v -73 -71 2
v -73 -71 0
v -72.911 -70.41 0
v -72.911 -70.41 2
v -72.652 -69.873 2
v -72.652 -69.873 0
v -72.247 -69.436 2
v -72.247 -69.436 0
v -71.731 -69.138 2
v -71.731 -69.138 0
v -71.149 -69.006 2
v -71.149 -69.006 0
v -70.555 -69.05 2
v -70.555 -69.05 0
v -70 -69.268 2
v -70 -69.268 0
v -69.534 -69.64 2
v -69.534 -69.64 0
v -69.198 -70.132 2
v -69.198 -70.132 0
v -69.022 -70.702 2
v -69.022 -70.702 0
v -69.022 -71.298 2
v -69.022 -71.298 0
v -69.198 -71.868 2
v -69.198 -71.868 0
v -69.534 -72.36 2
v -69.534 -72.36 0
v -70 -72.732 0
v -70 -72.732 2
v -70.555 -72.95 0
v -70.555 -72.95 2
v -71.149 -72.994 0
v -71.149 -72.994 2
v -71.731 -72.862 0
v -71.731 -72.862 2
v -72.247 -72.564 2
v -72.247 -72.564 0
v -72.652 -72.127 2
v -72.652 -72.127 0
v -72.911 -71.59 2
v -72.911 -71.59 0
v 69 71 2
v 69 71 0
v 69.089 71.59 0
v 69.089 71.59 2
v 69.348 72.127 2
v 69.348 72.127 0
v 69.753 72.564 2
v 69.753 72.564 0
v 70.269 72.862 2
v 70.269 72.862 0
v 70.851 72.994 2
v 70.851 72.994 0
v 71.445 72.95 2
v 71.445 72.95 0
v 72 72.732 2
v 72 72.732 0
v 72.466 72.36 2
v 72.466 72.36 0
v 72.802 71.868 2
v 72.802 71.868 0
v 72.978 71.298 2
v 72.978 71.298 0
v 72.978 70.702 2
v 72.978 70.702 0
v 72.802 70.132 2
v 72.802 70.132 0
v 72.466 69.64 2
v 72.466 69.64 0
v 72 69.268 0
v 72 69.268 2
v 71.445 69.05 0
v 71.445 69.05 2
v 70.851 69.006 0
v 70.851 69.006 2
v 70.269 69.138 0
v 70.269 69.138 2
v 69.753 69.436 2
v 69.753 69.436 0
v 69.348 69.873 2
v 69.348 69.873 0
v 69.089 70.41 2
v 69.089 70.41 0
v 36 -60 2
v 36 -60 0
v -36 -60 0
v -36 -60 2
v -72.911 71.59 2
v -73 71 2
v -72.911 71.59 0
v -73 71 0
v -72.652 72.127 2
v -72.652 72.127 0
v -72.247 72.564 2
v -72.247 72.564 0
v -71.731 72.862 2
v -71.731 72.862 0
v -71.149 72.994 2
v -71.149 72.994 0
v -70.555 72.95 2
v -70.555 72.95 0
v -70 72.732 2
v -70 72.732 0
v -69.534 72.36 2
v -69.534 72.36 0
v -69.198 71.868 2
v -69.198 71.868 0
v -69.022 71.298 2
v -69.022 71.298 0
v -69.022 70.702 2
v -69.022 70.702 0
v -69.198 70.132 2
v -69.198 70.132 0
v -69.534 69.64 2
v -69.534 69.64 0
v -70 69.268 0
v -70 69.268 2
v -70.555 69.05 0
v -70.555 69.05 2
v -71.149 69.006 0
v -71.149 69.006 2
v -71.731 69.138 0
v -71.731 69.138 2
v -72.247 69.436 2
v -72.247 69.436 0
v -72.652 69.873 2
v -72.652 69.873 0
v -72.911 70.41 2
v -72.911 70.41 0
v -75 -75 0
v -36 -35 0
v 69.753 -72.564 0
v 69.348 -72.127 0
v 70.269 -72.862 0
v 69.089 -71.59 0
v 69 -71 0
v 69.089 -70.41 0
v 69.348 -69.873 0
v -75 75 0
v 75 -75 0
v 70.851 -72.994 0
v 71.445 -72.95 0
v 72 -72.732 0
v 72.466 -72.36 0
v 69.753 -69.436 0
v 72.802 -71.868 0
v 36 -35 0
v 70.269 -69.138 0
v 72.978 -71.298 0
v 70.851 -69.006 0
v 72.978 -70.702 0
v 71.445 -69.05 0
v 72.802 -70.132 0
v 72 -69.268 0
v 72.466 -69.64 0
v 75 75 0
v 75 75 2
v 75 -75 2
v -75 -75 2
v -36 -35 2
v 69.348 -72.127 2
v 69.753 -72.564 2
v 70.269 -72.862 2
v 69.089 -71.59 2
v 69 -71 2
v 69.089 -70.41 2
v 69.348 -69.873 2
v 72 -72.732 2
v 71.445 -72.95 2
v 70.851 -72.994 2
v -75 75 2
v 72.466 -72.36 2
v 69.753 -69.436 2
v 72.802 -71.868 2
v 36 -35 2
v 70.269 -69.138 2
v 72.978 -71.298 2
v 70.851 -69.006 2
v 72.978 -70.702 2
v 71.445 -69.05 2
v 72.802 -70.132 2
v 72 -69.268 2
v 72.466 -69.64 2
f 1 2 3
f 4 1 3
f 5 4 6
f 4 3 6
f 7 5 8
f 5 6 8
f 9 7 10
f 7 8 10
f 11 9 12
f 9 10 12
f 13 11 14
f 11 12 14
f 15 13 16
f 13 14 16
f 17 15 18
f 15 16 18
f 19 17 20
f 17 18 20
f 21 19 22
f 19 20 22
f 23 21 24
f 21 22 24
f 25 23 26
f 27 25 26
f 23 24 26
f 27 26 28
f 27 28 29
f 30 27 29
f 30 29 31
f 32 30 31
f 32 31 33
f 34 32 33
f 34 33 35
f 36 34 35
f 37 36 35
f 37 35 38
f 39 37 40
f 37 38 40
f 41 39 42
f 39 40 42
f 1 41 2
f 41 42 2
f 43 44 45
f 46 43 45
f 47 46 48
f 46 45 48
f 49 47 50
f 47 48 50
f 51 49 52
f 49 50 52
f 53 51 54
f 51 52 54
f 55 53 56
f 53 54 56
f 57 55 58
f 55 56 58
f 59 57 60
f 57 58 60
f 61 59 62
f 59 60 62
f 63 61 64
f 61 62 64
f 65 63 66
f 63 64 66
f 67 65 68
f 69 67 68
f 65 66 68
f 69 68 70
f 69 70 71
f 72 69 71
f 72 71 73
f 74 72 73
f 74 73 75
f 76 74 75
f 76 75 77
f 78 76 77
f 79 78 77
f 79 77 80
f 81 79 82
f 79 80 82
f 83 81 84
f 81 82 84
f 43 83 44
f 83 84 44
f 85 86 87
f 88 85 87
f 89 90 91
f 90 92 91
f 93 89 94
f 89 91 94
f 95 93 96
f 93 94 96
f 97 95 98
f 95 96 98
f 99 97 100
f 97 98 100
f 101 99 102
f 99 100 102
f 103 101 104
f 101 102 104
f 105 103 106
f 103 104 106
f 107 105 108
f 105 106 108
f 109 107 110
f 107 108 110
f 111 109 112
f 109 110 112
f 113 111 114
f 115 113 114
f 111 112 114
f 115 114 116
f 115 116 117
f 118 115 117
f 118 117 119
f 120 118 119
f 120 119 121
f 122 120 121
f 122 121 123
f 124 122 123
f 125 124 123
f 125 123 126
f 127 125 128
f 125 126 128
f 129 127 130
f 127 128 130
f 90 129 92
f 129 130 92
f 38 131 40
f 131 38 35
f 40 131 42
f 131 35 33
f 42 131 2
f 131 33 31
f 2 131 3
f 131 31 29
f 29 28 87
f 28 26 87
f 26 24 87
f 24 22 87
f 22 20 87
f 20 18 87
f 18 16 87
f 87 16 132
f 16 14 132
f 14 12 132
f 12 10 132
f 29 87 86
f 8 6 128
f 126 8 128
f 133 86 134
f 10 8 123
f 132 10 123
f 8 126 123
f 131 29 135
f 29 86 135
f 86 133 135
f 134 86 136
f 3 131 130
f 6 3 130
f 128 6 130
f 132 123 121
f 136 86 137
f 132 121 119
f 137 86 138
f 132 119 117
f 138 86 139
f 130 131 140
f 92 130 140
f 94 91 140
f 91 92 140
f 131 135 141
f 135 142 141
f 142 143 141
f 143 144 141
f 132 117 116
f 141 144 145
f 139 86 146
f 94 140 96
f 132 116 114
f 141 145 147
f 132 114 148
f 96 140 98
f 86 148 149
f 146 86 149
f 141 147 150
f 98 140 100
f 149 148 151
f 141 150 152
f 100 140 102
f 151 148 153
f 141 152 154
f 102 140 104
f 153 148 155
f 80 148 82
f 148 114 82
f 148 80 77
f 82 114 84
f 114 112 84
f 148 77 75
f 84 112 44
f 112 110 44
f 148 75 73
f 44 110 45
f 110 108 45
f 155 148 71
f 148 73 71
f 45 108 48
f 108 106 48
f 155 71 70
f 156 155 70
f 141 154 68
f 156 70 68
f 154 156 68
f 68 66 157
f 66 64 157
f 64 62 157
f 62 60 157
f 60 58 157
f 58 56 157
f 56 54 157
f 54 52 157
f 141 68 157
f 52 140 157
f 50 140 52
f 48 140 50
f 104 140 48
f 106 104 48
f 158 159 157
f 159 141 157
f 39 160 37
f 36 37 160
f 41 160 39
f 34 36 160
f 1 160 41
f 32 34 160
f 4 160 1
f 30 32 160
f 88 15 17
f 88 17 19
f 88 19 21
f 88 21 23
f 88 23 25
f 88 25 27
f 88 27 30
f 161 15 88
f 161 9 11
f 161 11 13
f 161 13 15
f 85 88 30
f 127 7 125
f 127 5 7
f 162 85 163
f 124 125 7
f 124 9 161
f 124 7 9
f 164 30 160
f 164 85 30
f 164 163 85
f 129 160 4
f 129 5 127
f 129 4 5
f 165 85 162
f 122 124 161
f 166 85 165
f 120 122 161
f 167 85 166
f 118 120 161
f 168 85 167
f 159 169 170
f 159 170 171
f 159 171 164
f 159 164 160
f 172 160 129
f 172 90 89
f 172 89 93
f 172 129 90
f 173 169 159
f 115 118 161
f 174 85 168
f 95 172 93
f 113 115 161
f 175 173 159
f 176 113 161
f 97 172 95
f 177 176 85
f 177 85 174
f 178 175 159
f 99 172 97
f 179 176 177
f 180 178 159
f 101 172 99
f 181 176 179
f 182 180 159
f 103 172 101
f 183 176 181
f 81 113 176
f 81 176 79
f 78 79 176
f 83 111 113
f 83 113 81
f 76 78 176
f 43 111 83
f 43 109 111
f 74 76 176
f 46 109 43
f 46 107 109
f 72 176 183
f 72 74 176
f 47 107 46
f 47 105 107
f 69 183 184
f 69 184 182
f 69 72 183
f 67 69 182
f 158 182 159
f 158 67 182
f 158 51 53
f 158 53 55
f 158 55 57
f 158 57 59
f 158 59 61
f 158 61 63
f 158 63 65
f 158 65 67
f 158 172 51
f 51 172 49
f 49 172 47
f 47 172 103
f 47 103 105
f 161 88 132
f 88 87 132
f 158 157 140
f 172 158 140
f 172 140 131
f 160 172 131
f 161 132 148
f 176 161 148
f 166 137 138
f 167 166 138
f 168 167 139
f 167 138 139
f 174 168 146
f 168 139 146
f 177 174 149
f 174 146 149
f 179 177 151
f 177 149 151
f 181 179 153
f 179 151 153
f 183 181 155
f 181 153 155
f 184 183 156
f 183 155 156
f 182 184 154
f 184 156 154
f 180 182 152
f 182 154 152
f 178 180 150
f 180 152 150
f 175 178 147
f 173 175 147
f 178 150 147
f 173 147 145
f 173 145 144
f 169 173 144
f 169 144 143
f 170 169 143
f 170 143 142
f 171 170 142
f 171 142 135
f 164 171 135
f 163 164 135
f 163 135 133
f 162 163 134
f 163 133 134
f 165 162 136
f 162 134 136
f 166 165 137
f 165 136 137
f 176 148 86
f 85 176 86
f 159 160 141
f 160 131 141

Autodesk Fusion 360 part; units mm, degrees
sketch "Sketch1" plane through (0, 0, 0) normal (0, 0, 1) x (1, 0, 0)
  line L0 (75, 75) -> (-75, 75)
  line L1 (-75, 75) -> (-75, -75)
  line L2 (-75, -75) -> (75, -75)
  line L3 (75, -75) -> (75, 75)
  line L4 (75, 75) -> (-75, -75) construction
  line L5 (-75, 75) -> (75, -75) construction
  dimension "d1" = 150
  dimension "d2" = 150
extrude "Extrude1" add sketch "Sketch1" along normal blind 1
sketch "Sketch2" plane through (0, 0, 1) normal (0, 0, 1) x (-1, 0, 0)
  line L0 (-75, 75) -> (-75, -75)
  line L1 (-75, -75) -> (75, -75)
  line L2 (75, -75) -> (75, 75)
  line L3 (75, 75) -> (-75, 75)
  line L4 (-75, -75) -> (-71, -75)
  line L5 (-71, -75) -> (-71, -71)
  line L6 (-71, -71) -> (-75, -71)
  line L7 (-75, -71) -> (-75, -75)
  circle A0 centre (-71, -71) radius 2
  dimension "d5" = 4
  dimension "d6" = 4
  dimension "d7" = 4
extrude "Extrude2" cut sketch "Sketch2" against normal blind 1 contours L5 L6 A0 | L5 L6 A0
sketch "Sketch3" plane through (0, 0, 1) normal (0, 0, 1) x (-1, 0, 0)
  circle A0 centre (-71, -71) radius 2
  line L0 (-75, 75) -> (-75, -75)
  line L1 (-75, -75) -> (75, -75)
  line L2 (75, -75) -> (75, 75)
  line L3 (75, 75) -> (-75, 75)
  line L4 (75, -75) -> (71, -75)
  line L5 (71, -75) -> (71, -71)
  line L6 (71, -71) -> (75, -71)
  line L7 (75, -71) -> (75, -75)
  line L8 (75, 75) -> (71, 75)
  line L9 (71, 75) -> (71, 71)
  line L10 (71, 71) -> (75, 71)
  line L11 (75, 71) -> (75, 75)
  line L12 (-75, 75) -> (-71, 75)
  line L13 (-71, 75) -> (-71, 71)
  line L14 (-71, 71) -> (-75, 71)
  line L15 (-75, 71) -> (-75, 75)
  circle A1 centre (-71, 71) radius 2
  circle A2 centre (71, 71) radius 2
  circle A3 centre (71, -71) radius 2
  dimension "d10" = 4
  dimension "d11" = 4
  dimension "d12" = 4
  dimension "d13" = 4
  dimension "d14" = 4
  dimension "d15" = 4
  dimension "d16" = 4
  dimension "d17" = 4
  dimension "d18" = 4
extrude "Extrude3" cut sketch "Sketch3" against normal blind 1 contours L13 L14 A1 | L13 L14 A1 | L9 L10 A2 | L9 L10 A2 | L5 L6 A3 | L5 L6 A3
sketch "Sketch4" plane through (0, 0, 1) normal (0, 0, 1) x (-1, 0, 0)
  circle A0 centre (71, -71) radius 2
  circle A1 centre (71, 71) radius 2
  circle A2 centre (-71, 71) radius 2
  circle A3 centre (-71, -71) radius 2
  line L0 (-75, 75) -> (-75, -75)
  line L1 (-75, -75) -> (75, -75)
  line L2 (75, -75) -> (75, 75)
  line L3 (75, 75) -> (-75, 75)
  line L4 (0, 75) -> (0, 60)
  line L5 (0, 60) -> (-36, 60)
  line L6 (-36, 60) -> (36, 60)
  line L7 (36, 60) -> (36, 35)
  line L8 (36, 35) -> (-36, 35)
  line L9 (-36, 35) -> (-36, 60)
  dimension "d21" = 15
  dimension "d24" = 72
extrude "Extrude4" cut sketch "Sketch4" against normal blind 1 contours L5 L6 L7 L8 L9
extrude "Extrude5" add 1 faces at (-12, 35.1244, 1) along direction (0, 0, 1) blind 1
